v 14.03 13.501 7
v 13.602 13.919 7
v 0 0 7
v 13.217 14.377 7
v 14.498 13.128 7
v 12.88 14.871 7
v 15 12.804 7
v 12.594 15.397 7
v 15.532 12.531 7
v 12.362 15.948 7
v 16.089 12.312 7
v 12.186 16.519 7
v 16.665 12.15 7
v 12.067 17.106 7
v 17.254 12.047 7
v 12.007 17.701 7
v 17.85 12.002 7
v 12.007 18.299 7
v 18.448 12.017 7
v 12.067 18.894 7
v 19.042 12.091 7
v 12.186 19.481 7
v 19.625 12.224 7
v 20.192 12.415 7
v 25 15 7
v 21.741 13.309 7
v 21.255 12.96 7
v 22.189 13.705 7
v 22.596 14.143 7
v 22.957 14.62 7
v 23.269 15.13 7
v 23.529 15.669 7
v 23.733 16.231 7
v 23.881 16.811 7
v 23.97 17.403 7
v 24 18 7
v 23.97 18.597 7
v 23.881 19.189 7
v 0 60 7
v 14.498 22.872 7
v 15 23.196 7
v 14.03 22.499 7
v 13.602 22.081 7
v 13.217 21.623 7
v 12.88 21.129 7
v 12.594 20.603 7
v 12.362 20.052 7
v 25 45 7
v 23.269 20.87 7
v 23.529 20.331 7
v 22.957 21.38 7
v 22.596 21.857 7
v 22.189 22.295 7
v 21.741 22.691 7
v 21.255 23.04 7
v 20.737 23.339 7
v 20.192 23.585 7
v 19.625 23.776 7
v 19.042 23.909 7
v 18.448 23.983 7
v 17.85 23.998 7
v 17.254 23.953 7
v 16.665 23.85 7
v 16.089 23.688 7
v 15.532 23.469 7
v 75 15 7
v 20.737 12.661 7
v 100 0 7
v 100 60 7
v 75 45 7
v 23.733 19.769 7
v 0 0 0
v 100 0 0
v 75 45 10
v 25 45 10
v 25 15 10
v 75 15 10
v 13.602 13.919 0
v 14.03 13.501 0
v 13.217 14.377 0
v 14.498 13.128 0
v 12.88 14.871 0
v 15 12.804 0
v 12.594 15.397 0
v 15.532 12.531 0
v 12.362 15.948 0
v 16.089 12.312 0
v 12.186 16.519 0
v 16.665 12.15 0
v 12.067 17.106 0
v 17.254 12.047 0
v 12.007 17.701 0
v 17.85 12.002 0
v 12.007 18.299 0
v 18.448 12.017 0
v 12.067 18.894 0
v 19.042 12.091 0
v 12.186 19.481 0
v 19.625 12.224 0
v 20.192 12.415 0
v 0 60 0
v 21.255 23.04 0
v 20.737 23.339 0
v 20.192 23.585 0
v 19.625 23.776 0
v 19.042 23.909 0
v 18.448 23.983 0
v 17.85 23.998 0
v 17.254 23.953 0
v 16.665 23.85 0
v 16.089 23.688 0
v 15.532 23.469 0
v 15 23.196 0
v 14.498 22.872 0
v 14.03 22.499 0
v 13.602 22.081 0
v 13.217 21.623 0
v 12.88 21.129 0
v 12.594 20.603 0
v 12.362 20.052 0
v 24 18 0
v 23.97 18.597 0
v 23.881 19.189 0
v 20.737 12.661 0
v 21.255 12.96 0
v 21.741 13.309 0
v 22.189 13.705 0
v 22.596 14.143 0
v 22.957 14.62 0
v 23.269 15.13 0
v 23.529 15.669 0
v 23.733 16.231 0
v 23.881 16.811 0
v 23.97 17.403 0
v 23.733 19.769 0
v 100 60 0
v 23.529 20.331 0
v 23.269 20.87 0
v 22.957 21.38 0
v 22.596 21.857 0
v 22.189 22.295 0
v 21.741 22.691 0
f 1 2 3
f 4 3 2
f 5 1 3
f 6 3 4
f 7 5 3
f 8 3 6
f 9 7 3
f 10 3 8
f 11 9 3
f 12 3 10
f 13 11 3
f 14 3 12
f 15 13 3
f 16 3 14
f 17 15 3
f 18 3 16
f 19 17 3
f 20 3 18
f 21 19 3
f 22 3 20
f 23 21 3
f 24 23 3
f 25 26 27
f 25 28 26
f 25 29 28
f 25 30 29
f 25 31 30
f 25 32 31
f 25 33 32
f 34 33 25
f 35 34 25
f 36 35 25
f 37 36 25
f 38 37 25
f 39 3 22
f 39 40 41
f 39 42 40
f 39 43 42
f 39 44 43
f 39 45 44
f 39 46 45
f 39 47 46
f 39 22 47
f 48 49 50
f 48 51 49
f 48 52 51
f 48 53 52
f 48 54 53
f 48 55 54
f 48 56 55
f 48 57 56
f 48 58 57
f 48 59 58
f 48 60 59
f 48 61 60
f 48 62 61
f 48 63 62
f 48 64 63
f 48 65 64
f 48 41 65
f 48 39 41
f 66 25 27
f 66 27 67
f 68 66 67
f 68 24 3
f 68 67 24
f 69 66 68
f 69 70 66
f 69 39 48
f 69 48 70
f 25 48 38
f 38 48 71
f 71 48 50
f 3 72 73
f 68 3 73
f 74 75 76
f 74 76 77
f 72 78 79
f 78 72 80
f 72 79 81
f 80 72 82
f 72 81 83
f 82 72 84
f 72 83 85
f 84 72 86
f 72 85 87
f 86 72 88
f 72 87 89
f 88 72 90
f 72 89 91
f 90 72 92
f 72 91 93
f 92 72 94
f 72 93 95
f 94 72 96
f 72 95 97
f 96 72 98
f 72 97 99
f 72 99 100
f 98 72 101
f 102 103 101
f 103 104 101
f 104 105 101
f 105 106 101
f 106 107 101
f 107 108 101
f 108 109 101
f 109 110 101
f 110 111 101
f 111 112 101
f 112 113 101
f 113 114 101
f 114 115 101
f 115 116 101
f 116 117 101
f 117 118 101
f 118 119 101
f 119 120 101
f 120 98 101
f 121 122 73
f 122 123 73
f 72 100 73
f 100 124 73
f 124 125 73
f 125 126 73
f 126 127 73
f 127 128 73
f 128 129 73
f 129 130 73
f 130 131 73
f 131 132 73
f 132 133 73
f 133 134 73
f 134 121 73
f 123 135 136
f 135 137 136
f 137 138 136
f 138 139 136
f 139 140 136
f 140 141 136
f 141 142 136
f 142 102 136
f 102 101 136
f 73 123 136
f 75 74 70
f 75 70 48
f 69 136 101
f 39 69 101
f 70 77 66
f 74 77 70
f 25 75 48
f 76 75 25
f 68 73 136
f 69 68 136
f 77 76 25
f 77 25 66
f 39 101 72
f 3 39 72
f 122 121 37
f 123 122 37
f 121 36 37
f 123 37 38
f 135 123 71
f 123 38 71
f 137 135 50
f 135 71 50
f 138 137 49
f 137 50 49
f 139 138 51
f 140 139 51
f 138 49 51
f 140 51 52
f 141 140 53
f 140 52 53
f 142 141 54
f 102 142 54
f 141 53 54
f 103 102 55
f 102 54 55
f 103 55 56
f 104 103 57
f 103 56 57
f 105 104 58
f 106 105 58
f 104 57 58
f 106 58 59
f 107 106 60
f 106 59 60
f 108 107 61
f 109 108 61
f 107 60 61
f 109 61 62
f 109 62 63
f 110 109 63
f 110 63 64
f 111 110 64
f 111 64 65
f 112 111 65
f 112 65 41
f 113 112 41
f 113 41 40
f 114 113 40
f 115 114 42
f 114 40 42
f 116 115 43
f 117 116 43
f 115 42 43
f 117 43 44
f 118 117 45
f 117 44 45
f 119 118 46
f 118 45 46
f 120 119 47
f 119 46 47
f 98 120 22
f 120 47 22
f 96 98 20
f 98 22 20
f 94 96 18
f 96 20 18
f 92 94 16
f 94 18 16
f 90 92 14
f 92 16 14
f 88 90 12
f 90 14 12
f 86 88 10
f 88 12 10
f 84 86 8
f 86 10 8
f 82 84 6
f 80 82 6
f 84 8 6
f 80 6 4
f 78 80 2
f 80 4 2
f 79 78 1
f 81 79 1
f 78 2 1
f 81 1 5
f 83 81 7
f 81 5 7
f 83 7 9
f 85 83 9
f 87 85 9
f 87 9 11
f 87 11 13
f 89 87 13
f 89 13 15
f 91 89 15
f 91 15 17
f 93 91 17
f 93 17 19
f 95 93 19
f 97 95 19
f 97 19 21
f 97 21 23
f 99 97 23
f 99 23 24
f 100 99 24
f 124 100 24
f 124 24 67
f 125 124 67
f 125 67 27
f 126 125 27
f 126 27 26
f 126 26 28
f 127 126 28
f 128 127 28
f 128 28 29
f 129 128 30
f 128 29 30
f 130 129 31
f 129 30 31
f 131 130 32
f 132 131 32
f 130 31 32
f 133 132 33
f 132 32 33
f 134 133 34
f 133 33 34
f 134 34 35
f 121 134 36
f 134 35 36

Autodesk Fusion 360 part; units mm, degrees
sketch "sketch_base_outline" plane through (0, 0, 0) normal (0, 0, 1) x (1, 0, 0)
  line L0 (0, 0) -> (100, 0)
  line L1 (100, 0) -> (100, 60)
  line L2 (100, 60) -> (0, 60)
  line L3 (0, 60) -> (0, 0)
extrude "Extrude1" add sketch "sketch_base_outline" along normal blind 10
sketch "sketch_center_pocket" plane through (0, 0, 10) normal (0, 0, 1) x (1, 0, 0)
  line L0 (0, 60) -> (0, 0)
  line L1 (0, 0) -> (100, 0)
  line L2 (100, 0) -> (100, 60)
  line L3 (100, 60) -> (0, 60)
  line L4 (25, 15) -> (75, 15)
  line L5 (75, 15) -> (75, 45)
  line L6 (75, 45) -> (25, 45)
  line L7 (25, 45) -> (25, 15)
extrude "center_pocket" cut sketch "sketch_center_pocket" against normal blind 3
sketch "sketch_bore_hole" plane through (0, 0, 10) normal (0, 0, 1) x (1, 0, 0)
  line L0 (75, 45) -> (25, 45)
  line L1 (25, 45) -> (25, 15)
  line L2 (25, 15) -> (75, 15)
  line L3 (75, 15) -> (75, 45)
  circle A0 centre (18, 18) radius 6
extrude "bore_hole" cut sketch "sketch_bore_hole" against normal blind 10 contours A0
equation "d3 = -( 3 mm )"
equation "d5 = -( 10 mm )"
